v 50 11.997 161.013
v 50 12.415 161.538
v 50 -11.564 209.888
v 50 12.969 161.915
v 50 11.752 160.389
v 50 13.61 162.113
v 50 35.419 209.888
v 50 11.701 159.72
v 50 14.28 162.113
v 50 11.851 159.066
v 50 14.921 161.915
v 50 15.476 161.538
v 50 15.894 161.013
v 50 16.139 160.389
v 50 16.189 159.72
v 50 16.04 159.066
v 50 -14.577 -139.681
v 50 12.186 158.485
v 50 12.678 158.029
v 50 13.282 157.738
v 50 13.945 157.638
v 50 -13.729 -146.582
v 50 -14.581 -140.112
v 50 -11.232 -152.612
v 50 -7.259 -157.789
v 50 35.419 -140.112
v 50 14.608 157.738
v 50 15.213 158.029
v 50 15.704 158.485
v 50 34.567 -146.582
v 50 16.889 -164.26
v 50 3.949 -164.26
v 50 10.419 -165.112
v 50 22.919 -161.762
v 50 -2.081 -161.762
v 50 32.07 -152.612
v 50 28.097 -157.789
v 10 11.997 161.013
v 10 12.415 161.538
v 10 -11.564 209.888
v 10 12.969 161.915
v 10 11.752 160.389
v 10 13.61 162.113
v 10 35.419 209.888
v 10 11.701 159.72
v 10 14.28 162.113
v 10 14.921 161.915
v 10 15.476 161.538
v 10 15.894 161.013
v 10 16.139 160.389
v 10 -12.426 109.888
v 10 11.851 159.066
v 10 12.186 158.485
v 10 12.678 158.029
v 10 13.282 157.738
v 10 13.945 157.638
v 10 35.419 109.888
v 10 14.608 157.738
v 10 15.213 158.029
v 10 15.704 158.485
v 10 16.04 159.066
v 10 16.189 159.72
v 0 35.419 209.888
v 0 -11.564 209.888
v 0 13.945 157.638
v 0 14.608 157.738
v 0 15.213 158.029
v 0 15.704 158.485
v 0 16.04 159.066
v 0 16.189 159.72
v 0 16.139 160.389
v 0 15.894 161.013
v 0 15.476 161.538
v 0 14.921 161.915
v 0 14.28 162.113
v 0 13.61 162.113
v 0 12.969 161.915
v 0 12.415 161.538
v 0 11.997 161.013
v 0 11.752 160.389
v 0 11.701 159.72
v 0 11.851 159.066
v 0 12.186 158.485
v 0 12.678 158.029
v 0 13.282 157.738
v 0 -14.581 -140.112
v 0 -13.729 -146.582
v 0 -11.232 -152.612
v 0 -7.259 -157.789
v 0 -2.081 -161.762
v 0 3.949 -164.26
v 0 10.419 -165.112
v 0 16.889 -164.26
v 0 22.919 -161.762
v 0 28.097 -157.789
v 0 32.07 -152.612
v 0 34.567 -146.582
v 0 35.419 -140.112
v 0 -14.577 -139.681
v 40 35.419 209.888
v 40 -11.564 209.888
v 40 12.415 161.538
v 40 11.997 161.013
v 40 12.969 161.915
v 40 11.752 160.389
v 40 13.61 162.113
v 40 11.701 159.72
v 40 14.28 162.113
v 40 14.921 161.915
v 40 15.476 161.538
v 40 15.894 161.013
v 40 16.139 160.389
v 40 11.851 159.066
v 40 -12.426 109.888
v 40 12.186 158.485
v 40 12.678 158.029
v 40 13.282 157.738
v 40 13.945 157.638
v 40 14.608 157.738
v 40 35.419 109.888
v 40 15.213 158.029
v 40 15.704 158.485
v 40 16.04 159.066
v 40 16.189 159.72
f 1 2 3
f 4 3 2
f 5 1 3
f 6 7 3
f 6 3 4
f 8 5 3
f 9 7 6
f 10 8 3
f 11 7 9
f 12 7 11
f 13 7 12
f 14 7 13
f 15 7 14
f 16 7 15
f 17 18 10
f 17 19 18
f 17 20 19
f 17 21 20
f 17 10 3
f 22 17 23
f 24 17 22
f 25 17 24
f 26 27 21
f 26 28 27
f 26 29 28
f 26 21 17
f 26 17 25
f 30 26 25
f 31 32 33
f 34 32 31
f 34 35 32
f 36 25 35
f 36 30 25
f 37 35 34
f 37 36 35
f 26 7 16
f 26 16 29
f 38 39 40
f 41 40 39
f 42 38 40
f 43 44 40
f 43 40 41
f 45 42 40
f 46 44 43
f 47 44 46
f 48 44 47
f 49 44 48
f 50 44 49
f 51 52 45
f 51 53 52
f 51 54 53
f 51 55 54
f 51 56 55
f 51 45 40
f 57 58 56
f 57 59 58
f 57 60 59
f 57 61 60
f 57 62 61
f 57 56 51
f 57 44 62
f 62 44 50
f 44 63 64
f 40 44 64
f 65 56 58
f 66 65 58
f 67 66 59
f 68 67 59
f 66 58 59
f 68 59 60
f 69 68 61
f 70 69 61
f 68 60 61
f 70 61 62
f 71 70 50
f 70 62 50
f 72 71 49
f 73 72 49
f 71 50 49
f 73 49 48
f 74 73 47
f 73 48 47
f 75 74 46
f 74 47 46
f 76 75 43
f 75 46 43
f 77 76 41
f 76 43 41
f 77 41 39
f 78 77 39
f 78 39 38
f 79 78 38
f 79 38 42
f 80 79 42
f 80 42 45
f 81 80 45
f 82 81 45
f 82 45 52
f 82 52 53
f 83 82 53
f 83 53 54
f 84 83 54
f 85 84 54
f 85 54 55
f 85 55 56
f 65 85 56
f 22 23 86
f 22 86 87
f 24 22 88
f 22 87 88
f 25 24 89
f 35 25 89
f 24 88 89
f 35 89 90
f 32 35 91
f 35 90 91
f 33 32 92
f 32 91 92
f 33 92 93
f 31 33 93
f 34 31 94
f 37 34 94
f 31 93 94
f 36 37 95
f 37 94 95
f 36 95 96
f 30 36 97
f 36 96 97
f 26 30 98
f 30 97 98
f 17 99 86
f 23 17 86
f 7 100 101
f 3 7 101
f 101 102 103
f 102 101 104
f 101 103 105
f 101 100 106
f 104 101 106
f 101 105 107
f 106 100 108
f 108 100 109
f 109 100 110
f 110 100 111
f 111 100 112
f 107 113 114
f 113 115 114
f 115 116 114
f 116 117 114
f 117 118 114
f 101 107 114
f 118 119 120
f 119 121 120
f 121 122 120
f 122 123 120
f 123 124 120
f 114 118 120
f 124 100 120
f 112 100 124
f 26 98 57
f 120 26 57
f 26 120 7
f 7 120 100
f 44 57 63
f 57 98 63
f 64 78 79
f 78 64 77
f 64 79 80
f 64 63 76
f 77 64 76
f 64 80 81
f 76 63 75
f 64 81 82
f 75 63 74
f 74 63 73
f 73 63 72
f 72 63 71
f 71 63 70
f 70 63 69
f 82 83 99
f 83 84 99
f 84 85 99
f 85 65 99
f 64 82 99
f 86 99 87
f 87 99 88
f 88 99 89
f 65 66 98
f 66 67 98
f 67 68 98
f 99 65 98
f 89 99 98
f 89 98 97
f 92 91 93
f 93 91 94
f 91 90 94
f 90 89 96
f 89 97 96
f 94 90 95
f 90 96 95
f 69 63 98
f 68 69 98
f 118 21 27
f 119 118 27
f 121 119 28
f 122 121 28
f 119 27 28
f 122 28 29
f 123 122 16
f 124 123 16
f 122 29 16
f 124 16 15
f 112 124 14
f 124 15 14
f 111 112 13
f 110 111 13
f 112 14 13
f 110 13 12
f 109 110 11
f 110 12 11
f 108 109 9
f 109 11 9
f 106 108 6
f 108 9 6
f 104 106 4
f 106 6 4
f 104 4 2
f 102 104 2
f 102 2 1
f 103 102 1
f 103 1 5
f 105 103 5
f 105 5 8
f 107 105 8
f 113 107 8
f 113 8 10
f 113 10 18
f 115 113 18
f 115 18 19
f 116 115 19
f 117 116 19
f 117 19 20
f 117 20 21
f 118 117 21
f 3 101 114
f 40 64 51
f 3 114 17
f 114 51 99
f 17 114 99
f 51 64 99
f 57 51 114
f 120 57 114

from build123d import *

# Parameters (mm, degrees)
BOSS_EXTRUDE1_DEPTH = 50
SKETCH6_W           = 30
SKETCH6_H           = 100
CUT_EXTRUDE3_DEPTH  = 222.479310794
SKETCH5_R           = 2.25
CUT_EXTRUDE2_DEPTH  = 219.649468957


with BuildPart() as part:
    # Sketch1 → Boss-Extrude1 (new body)
    with BuildSketch(Plane(origin=(0, 0, 0), x_dir=(0, 0, -1), z_dir=(1, 0, 0))):
        with BuildLine():
            Line((140.111731844, 35.418994413), (-209.888268156, 35.418994413))
            Line((-209.888268156, 35.418994413), (-209.888268156, 13.43575419))
            Line((-209.888268156, 13.43575419), (-209.888268156, -11.56424581))
            Line((-209.888268156, -11.56424581), (139.680798176, -14.577291234))
            ThreePointArc((139.680798176, -14.577291234), (115.112660449, 10.634469251), (140.111731844, 35.418994413))
        make_face()
        with BuildLine():
            Line((140.111731844, -14.581005587), (140.111731844, 35.418994413))
            ThreePointArc((140.111731844, 35.418994413), (115.112660449, 10.634469251), (139.680798176, -14.577291234))
            Line((139.680798176, -14.577291234), (140.111731844, -14.581005587))
        make_face()
        with BuildLine():
            ThreePointArc((165.111731844, 10.418994413), (157.789401373, 28.096663943), (140.111731844, 35.418994413))
            Line((140.111731844, 35.418994413), (140.111731844, -14.581005587))
            ThreePointArc((140.111731844, -14.581005587), (157.789401373, -7.258675116), (165.111731844, 10.418994413))
        make_face()
    extrude(amount=BOSS_EXTRUDE1_DEPTH)

    # Sketch6 → Cut-Extrude3 (cut, through all)
    with BuildSketch(Plane(origin=(0, 35.418994413, 0), x_dir=(1, 0, 0), z_dir=(0, 1, 0))):
        with Locations((25, -159.888268156)):
            Rectangle(SKETCH6_W, SKETCH6_H)
    extrude(amount=-CUT_EXTRUDE3_DEPTH, mode=Mode.SUBTRACT)

    # Sketch5 → Cut-Extrude2 (cut, through all)
    with BuildSketch(Plane(origin=(50, 0, 0), x_dir=(0, 0, -1), z_dir=(1, 0, 0))):
        with Locations((-159.888268156, 13.945126907)):
            Circle(SKETCH5_R)
    extrude(amount=-CUT_EXTRUDE2_DEPTH, mode=Mode.SUBTRACT)


solid = part.part
